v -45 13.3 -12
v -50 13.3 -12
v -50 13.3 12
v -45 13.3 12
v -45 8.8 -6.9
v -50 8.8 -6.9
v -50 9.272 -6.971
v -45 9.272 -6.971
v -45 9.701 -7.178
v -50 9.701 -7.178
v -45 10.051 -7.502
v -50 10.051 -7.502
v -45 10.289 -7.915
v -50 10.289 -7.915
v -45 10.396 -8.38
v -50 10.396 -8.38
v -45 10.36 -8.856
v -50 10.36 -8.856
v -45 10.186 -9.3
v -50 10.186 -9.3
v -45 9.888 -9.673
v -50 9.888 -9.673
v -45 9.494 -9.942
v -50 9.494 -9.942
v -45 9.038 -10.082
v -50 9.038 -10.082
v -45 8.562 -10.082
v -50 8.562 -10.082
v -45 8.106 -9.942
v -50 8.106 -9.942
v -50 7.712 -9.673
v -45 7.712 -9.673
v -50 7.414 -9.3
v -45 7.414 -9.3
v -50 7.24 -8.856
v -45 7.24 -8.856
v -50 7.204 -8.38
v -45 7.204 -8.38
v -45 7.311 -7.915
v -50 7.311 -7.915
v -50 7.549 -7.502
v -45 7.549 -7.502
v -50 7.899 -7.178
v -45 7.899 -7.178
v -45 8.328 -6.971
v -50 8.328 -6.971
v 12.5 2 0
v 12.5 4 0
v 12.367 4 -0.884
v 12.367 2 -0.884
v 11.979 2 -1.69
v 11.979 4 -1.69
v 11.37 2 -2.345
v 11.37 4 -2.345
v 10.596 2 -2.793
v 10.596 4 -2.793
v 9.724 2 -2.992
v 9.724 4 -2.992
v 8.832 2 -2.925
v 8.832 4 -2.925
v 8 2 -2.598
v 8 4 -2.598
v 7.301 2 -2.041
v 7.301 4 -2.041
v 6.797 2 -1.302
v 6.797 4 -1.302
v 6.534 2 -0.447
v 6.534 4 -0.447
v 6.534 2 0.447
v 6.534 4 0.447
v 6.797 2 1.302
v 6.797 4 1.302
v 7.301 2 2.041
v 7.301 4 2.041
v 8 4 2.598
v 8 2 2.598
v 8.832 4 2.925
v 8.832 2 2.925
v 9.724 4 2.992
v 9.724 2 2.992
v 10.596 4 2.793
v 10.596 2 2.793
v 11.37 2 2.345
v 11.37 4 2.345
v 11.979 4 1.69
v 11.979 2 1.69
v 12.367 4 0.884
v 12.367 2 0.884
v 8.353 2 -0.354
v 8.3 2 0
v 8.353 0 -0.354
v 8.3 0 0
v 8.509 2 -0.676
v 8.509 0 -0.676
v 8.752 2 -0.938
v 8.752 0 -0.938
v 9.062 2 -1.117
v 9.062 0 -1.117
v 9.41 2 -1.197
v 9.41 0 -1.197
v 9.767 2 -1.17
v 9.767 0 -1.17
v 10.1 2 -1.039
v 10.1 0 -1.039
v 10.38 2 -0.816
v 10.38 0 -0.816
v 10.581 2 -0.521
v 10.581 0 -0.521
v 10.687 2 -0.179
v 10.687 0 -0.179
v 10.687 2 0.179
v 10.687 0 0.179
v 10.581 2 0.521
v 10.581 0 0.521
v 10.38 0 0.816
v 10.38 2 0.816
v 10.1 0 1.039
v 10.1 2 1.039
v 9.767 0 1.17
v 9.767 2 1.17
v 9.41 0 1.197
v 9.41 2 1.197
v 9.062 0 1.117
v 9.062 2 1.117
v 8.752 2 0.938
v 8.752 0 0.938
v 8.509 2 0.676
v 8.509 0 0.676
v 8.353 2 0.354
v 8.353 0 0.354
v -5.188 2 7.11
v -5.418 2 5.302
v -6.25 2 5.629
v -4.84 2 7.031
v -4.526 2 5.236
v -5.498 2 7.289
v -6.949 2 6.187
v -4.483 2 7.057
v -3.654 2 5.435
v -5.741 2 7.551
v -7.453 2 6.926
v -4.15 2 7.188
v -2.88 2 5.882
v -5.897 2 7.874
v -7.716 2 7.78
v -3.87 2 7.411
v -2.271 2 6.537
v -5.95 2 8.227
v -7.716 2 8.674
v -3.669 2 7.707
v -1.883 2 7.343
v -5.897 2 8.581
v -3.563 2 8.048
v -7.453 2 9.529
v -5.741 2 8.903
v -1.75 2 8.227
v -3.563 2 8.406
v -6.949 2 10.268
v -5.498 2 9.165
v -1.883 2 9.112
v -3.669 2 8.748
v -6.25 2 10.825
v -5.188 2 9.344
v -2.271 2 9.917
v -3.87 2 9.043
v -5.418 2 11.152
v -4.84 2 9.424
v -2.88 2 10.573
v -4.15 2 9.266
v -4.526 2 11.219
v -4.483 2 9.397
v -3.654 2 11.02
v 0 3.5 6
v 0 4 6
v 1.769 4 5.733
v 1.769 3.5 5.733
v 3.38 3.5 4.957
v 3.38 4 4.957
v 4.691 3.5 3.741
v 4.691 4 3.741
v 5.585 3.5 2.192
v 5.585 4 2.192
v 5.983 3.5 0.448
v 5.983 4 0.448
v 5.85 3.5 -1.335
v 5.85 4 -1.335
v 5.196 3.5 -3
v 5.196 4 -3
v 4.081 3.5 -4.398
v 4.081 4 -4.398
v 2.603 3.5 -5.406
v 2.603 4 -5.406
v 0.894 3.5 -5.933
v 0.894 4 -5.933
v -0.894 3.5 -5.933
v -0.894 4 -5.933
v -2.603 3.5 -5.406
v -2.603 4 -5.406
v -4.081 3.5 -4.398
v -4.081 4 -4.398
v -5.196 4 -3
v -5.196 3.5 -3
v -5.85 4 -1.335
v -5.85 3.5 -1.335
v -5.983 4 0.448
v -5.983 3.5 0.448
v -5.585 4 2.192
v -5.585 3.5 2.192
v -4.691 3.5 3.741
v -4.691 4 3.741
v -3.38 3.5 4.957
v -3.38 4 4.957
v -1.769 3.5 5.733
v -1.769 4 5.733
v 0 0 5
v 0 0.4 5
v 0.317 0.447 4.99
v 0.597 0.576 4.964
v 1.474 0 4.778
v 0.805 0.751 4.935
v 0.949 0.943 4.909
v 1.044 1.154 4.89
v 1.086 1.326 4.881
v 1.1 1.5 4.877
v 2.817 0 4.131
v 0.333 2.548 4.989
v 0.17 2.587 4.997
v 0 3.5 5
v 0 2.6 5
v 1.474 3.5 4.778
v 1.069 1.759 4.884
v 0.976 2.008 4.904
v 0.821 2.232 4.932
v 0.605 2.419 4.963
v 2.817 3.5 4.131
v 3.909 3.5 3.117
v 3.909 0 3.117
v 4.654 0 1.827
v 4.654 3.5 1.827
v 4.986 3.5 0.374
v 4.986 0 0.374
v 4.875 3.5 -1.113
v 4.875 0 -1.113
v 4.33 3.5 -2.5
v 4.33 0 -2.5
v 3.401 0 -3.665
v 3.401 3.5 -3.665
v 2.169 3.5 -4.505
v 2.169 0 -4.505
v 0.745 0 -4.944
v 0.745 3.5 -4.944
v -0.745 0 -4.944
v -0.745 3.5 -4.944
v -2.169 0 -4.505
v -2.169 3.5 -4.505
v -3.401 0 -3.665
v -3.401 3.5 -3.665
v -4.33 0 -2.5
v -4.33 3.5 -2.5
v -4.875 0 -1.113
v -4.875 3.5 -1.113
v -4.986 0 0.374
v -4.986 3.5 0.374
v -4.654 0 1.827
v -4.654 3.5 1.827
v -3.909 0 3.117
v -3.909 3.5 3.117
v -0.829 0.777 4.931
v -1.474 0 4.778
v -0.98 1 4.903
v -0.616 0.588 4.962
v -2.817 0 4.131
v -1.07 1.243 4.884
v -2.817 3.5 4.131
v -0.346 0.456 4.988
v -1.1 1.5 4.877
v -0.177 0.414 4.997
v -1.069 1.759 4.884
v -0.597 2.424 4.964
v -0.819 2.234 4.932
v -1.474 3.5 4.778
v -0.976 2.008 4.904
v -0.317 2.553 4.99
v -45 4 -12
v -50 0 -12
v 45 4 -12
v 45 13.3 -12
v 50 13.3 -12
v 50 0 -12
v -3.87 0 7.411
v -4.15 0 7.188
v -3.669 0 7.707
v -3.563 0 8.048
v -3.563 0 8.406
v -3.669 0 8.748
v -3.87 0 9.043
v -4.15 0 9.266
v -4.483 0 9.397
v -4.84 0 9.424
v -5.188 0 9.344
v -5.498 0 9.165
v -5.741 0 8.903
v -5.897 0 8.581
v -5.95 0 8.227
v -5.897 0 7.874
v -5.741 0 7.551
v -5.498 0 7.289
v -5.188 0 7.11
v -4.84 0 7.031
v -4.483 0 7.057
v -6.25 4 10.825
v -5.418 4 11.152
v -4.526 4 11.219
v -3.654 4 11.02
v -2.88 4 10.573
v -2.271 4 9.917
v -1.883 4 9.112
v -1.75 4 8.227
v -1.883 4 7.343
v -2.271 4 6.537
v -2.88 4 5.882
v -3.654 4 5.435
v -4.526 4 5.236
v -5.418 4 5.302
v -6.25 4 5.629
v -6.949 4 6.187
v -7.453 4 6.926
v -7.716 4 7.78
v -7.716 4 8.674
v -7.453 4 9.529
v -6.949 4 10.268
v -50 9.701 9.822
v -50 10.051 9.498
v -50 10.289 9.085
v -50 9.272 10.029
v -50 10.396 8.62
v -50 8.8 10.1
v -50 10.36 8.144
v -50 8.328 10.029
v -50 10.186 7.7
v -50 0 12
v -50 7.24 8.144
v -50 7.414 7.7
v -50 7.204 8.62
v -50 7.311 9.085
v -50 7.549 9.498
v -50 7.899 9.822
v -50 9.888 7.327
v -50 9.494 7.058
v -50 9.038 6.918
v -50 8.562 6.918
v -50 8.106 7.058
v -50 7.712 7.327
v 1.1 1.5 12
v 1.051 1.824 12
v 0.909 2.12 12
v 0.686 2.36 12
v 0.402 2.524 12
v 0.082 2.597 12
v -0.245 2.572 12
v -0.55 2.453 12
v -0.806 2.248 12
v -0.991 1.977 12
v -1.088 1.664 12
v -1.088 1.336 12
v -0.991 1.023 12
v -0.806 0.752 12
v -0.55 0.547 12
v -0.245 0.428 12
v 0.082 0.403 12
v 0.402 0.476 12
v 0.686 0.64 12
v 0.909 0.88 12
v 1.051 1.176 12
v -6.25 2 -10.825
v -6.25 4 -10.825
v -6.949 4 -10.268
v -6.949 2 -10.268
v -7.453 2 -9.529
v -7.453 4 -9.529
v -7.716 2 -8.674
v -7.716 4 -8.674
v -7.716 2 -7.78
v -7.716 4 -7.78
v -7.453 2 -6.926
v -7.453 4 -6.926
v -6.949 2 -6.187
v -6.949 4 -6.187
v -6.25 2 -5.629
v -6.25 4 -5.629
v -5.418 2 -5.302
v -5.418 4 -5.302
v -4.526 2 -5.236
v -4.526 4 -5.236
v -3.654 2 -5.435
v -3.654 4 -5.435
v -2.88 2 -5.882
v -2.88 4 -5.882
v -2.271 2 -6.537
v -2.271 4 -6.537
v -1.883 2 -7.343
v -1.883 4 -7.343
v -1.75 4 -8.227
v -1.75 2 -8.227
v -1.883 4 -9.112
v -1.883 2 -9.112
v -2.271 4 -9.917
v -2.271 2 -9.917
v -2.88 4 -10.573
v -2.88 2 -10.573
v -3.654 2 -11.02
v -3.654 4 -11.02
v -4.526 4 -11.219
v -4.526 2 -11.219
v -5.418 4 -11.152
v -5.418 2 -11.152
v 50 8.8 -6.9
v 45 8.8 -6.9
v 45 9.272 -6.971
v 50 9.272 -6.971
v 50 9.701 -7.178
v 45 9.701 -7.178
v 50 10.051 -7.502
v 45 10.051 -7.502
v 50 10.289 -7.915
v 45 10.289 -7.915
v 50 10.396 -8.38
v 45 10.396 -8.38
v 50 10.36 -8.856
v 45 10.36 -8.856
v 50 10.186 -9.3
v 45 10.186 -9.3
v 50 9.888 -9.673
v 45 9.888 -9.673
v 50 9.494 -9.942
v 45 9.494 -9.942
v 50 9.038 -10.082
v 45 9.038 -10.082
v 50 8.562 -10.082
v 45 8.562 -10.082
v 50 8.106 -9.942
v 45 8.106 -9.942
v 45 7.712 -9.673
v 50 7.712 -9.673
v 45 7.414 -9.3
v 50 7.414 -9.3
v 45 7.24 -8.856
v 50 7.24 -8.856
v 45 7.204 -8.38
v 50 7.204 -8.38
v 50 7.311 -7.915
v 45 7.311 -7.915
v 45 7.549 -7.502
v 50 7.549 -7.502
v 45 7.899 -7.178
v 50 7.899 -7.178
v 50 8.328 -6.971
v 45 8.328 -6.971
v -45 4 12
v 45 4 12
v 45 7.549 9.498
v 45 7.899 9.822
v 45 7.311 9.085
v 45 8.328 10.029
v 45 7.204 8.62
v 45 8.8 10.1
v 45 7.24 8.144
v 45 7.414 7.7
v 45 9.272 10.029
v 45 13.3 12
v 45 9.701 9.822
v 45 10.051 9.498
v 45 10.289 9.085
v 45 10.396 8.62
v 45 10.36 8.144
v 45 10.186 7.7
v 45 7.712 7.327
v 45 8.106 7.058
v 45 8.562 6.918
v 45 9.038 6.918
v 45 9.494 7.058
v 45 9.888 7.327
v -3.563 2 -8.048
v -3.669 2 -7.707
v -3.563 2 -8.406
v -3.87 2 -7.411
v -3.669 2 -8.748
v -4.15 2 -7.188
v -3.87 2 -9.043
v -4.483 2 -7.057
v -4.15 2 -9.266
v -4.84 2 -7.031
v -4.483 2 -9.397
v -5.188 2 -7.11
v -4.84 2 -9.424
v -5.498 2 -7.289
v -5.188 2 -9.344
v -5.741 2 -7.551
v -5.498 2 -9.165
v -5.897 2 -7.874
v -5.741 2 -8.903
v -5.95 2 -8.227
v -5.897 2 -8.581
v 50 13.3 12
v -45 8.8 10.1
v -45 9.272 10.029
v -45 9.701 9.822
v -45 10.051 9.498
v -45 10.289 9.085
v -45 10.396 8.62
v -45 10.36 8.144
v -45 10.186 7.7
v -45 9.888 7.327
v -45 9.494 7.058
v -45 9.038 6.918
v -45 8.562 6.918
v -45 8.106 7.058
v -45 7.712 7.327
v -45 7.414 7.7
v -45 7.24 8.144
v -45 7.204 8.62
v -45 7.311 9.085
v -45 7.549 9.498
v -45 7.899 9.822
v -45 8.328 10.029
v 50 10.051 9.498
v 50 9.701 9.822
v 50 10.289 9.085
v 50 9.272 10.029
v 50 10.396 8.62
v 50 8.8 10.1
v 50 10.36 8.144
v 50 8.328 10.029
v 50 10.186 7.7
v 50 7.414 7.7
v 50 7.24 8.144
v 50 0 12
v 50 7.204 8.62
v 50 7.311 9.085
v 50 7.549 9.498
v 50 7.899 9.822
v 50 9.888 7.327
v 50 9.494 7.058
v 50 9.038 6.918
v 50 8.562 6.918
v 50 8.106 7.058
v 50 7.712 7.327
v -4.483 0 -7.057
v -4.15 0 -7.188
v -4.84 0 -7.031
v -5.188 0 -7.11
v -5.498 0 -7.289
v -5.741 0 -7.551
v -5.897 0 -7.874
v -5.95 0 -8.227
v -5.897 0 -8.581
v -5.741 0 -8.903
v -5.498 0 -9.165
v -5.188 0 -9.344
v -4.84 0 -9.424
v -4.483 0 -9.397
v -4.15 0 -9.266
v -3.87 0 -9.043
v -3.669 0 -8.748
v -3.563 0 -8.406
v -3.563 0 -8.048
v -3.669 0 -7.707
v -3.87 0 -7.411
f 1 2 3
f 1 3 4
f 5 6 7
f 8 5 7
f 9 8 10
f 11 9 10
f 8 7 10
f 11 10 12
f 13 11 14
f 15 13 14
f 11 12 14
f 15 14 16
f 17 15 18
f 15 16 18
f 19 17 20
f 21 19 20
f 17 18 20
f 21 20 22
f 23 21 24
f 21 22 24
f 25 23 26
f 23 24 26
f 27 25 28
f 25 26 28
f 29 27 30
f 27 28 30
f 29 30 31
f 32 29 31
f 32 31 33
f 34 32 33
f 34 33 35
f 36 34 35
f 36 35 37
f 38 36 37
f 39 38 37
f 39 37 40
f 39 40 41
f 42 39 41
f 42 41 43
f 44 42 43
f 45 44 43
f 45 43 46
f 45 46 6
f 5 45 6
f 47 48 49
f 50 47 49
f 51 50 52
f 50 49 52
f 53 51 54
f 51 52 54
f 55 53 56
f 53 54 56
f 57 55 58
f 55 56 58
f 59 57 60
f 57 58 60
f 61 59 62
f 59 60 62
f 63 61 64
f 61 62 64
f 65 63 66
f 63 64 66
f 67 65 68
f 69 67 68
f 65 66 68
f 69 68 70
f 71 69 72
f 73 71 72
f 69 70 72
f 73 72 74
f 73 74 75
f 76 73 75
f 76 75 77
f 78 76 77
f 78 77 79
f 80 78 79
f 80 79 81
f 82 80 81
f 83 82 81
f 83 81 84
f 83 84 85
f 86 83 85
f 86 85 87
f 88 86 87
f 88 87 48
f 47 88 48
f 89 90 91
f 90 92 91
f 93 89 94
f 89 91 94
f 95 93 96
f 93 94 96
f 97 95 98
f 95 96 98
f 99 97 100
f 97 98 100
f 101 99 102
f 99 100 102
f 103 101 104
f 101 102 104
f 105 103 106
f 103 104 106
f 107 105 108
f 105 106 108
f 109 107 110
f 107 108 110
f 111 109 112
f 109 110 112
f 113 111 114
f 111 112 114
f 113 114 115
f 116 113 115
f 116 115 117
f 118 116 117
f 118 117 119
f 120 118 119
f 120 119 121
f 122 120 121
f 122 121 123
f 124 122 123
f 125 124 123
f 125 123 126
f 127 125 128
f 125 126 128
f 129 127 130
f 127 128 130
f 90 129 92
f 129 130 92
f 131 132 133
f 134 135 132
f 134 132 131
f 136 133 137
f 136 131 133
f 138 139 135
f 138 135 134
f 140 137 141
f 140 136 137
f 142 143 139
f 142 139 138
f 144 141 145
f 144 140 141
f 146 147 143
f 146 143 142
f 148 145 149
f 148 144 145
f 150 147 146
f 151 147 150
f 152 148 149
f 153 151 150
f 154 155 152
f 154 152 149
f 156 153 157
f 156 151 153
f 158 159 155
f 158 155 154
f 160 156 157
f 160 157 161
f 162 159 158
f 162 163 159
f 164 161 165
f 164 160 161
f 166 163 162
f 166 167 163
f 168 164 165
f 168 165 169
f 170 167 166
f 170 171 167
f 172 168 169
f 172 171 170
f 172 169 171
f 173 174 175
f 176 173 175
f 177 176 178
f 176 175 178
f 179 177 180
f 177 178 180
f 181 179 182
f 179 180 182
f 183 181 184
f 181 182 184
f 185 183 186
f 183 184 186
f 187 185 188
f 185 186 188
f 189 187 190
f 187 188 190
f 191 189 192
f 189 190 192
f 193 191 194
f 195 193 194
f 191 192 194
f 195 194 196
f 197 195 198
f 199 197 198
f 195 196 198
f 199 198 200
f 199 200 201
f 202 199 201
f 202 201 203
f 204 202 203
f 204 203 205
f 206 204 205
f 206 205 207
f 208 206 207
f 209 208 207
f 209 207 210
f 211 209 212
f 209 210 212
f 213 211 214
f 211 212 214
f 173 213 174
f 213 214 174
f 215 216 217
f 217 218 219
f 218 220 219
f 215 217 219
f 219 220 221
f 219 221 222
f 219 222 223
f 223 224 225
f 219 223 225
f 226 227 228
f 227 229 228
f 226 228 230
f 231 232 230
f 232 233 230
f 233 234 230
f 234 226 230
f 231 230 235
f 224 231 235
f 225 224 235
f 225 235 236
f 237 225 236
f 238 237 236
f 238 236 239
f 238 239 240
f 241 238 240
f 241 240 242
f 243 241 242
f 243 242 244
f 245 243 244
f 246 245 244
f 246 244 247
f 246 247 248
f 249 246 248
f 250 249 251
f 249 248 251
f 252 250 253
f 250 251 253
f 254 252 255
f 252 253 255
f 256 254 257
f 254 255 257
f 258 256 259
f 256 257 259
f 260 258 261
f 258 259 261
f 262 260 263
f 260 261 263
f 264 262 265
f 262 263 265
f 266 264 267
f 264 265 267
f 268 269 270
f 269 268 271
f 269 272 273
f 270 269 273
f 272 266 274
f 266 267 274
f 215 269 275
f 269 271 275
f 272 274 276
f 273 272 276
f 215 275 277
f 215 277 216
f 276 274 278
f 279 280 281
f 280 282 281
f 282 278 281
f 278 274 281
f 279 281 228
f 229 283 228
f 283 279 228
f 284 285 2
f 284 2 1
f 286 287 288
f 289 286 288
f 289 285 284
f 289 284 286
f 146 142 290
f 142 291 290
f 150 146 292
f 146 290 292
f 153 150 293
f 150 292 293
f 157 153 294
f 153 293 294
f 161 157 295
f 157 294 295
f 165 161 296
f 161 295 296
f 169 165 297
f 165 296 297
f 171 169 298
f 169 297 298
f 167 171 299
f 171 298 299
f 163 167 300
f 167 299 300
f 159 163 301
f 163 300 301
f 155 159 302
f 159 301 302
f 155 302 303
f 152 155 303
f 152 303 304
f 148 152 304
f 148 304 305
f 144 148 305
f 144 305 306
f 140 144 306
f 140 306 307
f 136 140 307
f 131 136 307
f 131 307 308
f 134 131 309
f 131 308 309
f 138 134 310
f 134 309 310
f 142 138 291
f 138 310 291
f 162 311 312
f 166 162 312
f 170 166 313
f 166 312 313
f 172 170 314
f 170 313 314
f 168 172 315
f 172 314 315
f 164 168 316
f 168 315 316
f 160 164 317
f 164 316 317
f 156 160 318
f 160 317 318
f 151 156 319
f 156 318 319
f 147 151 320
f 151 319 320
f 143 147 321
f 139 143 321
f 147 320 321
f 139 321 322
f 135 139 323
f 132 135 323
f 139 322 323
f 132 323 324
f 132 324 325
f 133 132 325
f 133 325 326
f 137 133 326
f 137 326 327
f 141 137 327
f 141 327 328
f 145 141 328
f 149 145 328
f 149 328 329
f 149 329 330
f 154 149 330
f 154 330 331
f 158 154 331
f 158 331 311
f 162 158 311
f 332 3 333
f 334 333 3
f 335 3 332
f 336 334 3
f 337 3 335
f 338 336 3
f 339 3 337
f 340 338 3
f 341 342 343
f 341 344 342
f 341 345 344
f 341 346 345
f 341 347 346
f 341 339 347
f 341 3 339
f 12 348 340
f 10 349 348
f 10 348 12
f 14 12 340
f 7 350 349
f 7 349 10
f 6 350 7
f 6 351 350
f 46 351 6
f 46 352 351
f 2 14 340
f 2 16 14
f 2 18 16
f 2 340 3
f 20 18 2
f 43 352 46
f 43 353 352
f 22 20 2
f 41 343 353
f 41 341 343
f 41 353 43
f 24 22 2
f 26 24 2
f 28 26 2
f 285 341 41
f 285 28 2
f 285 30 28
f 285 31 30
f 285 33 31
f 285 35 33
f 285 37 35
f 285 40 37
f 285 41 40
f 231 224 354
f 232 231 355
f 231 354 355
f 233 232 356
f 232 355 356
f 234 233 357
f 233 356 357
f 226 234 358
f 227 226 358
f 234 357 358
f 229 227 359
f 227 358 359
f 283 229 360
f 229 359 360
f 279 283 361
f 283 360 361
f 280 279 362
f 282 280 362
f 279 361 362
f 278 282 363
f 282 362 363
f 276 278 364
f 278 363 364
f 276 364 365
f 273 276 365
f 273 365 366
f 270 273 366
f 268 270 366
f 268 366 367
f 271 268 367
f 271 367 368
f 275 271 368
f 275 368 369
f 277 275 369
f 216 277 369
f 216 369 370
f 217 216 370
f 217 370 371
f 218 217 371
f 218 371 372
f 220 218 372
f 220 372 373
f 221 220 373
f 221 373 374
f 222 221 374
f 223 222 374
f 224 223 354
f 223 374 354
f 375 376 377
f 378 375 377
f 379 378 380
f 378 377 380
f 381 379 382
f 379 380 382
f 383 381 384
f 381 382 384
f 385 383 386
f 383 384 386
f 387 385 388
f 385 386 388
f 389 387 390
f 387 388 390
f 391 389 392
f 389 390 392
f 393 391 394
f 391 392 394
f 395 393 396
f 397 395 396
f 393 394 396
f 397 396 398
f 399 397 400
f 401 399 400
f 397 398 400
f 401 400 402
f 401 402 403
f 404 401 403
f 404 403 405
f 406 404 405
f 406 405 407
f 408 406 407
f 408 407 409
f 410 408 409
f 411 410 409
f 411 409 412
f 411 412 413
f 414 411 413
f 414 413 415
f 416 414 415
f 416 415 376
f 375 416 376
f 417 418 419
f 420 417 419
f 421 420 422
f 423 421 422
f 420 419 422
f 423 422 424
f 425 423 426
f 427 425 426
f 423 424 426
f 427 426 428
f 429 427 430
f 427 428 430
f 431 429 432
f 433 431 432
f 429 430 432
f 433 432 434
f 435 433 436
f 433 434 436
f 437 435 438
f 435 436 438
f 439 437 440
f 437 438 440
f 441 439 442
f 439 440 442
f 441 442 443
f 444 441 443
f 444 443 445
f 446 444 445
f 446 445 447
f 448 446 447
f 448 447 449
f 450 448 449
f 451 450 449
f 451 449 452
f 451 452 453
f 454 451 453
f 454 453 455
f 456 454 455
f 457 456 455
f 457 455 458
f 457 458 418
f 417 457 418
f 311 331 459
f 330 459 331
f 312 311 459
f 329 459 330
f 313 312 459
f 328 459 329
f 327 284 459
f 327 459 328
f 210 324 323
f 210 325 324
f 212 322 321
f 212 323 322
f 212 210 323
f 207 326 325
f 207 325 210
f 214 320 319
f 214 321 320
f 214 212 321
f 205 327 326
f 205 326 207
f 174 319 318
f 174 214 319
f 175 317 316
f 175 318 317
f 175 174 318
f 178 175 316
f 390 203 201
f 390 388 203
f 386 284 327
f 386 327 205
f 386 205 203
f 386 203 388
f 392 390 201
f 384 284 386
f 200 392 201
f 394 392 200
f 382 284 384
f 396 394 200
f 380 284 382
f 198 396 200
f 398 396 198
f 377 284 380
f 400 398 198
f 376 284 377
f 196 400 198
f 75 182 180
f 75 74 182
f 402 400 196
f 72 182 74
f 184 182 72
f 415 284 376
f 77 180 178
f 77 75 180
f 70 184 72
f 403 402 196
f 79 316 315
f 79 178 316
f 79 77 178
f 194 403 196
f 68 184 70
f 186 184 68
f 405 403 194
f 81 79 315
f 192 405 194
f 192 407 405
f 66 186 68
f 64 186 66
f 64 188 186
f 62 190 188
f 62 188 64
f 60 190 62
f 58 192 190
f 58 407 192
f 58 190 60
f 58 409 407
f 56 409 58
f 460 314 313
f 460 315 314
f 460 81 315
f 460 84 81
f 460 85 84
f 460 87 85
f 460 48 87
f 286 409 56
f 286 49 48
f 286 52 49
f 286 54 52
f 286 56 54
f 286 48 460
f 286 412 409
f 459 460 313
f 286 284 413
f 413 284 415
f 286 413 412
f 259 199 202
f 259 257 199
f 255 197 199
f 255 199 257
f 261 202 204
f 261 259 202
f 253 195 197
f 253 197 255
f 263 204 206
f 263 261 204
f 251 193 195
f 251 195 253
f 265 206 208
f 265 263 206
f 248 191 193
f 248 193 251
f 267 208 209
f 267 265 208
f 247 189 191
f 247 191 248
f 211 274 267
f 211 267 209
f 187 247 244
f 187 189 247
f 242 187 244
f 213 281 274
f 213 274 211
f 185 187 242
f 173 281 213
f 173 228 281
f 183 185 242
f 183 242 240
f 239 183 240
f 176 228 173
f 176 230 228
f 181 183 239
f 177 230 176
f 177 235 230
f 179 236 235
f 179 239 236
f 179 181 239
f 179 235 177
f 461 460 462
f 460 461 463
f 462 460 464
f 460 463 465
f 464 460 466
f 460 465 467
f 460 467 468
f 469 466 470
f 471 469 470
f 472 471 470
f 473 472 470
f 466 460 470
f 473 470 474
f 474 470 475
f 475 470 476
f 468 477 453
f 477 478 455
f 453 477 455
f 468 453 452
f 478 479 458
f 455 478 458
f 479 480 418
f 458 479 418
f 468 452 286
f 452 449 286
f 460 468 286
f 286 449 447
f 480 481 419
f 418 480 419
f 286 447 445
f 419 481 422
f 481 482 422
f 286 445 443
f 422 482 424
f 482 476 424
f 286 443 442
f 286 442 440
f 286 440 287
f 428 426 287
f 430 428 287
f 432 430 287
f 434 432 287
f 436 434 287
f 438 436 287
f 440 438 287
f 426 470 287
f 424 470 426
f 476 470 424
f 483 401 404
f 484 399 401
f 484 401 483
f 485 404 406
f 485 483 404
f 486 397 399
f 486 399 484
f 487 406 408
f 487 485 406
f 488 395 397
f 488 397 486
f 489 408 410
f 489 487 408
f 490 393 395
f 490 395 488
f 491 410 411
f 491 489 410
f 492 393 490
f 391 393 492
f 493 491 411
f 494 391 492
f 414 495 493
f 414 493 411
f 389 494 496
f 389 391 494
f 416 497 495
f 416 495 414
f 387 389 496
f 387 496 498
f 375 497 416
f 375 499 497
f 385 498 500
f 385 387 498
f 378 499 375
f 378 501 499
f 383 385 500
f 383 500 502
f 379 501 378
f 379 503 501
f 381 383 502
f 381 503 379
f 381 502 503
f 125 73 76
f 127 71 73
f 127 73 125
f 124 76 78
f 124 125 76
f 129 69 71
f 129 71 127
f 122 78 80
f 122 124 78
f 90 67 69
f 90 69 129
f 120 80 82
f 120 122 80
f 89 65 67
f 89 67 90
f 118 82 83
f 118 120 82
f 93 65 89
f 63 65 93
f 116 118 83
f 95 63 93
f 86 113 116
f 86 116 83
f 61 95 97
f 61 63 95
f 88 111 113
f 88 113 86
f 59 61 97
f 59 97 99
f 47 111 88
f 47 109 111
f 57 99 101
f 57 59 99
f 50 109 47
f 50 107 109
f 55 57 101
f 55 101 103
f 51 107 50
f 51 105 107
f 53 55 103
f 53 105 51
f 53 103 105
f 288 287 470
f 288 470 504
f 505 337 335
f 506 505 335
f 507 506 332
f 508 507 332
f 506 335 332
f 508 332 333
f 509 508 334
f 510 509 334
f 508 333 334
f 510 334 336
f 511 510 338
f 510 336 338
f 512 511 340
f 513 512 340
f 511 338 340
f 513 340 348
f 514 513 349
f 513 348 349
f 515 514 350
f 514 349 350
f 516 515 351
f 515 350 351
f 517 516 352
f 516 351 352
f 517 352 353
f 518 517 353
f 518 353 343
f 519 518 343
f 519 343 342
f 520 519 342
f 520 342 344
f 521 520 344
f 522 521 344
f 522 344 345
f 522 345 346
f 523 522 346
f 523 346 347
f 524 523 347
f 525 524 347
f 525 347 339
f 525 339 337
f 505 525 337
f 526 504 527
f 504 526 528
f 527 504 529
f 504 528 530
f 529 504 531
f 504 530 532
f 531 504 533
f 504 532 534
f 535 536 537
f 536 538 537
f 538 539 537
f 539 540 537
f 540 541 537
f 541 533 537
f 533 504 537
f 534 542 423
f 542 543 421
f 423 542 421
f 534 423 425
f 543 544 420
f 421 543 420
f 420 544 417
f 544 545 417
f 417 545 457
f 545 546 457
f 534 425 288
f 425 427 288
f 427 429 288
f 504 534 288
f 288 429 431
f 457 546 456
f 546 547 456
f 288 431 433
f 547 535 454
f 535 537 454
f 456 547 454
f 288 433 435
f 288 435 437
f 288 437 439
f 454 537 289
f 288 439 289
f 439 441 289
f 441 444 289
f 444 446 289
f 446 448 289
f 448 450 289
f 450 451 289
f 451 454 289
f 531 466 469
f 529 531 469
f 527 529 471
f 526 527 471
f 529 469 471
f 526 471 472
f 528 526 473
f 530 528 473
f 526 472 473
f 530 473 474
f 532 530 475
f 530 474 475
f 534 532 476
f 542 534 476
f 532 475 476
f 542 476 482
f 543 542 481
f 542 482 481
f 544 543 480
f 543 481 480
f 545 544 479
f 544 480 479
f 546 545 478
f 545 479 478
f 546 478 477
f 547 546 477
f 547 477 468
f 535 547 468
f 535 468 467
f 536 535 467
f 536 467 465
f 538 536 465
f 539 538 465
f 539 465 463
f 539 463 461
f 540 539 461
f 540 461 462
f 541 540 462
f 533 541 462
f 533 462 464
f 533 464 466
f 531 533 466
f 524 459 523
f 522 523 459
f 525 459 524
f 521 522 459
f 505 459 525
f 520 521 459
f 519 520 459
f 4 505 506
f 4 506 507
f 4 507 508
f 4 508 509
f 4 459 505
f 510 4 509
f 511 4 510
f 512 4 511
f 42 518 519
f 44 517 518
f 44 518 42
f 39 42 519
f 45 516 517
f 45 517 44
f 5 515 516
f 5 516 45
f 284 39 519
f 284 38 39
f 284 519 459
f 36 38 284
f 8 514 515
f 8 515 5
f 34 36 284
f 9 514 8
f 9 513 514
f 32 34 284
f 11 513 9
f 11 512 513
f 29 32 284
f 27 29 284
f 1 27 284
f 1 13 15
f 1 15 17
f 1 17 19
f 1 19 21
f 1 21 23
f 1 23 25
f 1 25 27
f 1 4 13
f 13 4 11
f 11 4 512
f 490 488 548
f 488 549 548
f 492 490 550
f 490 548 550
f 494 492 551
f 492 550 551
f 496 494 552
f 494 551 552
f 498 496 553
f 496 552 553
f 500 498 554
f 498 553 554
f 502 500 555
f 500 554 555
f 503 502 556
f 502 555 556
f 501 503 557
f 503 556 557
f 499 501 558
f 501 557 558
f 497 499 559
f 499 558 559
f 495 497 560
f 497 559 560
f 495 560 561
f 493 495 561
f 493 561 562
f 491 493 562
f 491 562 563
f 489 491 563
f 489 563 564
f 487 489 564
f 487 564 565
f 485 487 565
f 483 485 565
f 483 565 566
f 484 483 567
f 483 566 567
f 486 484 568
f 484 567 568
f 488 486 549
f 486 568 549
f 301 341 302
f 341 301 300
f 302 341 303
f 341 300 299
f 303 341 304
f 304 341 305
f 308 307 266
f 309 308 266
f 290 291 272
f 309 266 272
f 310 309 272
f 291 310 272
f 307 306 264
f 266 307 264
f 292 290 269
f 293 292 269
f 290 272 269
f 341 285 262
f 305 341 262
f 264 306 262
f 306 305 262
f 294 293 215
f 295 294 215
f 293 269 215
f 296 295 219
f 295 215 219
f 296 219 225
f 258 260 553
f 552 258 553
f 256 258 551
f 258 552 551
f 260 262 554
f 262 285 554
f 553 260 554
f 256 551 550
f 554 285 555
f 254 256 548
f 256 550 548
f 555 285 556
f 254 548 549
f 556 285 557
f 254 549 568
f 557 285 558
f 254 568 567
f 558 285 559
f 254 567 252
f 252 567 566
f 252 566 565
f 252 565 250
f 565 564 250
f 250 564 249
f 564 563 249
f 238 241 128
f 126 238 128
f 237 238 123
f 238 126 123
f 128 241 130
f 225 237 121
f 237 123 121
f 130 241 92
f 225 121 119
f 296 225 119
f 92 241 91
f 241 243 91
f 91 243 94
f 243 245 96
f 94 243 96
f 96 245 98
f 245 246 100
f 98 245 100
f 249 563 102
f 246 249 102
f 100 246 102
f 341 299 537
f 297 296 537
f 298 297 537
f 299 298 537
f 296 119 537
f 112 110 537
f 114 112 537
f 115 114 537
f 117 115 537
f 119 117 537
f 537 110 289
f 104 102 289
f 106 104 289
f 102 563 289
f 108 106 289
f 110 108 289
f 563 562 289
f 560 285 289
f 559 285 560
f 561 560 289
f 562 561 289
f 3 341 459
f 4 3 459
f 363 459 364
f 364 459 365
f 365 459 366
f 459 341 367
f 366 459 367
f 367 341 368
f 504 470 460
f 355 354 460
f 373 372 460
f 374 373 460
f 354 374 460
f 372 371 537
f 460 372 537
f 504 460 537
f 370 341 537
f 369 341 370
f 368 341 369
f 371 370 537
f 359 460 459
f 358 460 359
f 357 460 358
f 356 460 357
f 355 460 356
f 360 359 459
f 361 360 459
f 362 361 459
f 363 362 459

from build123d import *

# Parameters (mm, degrees)
SKETCH_1_W                   = 100
SKETCH_1_H                   = 24
EXTRUDE_1_DEPTH              = 13.3
SKETCH_2_W                   = 90
SKETCH_2_H                   = 24
CUT_EXTRUDE_1_DEPTH          = 9.3
HOLE_WIZARD_3_2_3_2_1_D      = 3.2
SKETCH_5_R                   = 5
CUT_EXTRUDE_2_DEPTH          = 53.254090749
SKETCH_6_R                   = 6
CUT_EXTRUDE_3_DEPTH          = 0.5
HOLE_WIZARD_M2_1_D           = 2.4
HOLE_WIZARD_M2_1_CBORE_D     = 6
HOLE_WIZARD_M2_1_CBORE_DEPTH = 2
PATTERN_CIRCULAR_1_COUNT     = 3
SKETCH_9_R                   = 1.1
CUT_EXTRUDE_4_DEPTH          = 10


with BuildPart() as part:
    # 草图1 → 凸台-拉伸1 (new body)
    with BuildSketch(Plane(origin=(0, 0, 0), x_dir=(1, 0, 0), z_dir=(0, 1, 0))):
        Rectangle(SKETCH_1_W, SKETCH_1_H)
    extrude(amount=EXTRUDE_1_DEPTH)

    # 草图2 → 切除-拉伸1 (cut)
    with BuildSketch(Plane(origin=(0, 13.3, 0), x_dir=(1, 0, 0), z_dir=(0, 1, 0))):
        Rectangle(SKETCH_2_W, SKETCH_2_H)
    extrude(amount=-CUT_EXTRUDE_1_DEPTH, mode=Mode.SUBTRACT)

    # Ø3.2 (3.2) 直径孔1 (through all)
    with Locations(Plane(origin=(50, 0, 0), x_dir=(0, 0, -1), z_dir=(1, 0, 0))):
        with Locations((8.5, 8.8), (-8.5, 8.8)):
            Hole(HOLE_WIZARD_3_2_3_2_1_D / 2)

    # 草图5 → 切除-拉伸2 (cut, through all)
    with BuildSketch(Plane(origin=(0, 4, 0), x_dir=(1, 0, 0), z_dir=(0, 1, 0))):
        with Locations(Location((0, 0, 0), (0, 0, 270))):
            Circle(SKETCH_5_R)
    extrude(amount=-CUT_EXTRUDE_2_DEPTH, mode=Mode.SUBTRACT)

    # 草图6 → 切除-拉伸3 (cut)
    with BuildSketch(Plane(origin=(0, 4, 0), x_dir=(1, 0, 0), z_dir=(0, 1, 0))):
        with Locations(Location((0, 0, 0), (0, 0, 270))):
            Circle(SKETCH_6_R)
    extrude(amount=-CUT_EXTRUDE_3_DEPTH, mode=Mode.SUBTRACT)

    # M2 六角头螺栓的柱形沉头孔1 (through all)
    with Locations(Plane(origin=(0, 4, 0), x_dir=(1, 0, 0), z_dir=(0, 1, 0))):
        with Locations((9.5, 0)):
            hole_wizard_m2_1 = CounterBoreHole(HOLE_WIZARD_M2_1_D / 2, HOLE_WIZARD_M2_1_CBORE_D / 2, HOLE_WIZARD_M2_1_CBORE_DEPTH)

    # 阵列(圆周)1: M2 六角头螺栓的柱形沉头孔1 ×3 about axis
    pattern_circular_1_axis = Axis((0, 0, 0), (0, 1, 0))
    for i in range(1, PATTERN_CIRCULAR_1_COUNT):
        add(hole_wizard_m2_1.rotate(pattern_circular_1_axis, i * 360 / PATTERN_CIRCULAR_1_COUNT), mode=Mode.SUBTRACT)

    # 草图9 → 切除-拉伸4 (cut)
    with BuildSketch(Plane.XY.offset(12)):
        with Locations((0, 1.5)):
            Circle(SKETCH_9_R)
    extrude(amount=-CUT_EXTRUDE_4_DEPTH, mode=Mode.SUBTRACT)


solid = part.part
